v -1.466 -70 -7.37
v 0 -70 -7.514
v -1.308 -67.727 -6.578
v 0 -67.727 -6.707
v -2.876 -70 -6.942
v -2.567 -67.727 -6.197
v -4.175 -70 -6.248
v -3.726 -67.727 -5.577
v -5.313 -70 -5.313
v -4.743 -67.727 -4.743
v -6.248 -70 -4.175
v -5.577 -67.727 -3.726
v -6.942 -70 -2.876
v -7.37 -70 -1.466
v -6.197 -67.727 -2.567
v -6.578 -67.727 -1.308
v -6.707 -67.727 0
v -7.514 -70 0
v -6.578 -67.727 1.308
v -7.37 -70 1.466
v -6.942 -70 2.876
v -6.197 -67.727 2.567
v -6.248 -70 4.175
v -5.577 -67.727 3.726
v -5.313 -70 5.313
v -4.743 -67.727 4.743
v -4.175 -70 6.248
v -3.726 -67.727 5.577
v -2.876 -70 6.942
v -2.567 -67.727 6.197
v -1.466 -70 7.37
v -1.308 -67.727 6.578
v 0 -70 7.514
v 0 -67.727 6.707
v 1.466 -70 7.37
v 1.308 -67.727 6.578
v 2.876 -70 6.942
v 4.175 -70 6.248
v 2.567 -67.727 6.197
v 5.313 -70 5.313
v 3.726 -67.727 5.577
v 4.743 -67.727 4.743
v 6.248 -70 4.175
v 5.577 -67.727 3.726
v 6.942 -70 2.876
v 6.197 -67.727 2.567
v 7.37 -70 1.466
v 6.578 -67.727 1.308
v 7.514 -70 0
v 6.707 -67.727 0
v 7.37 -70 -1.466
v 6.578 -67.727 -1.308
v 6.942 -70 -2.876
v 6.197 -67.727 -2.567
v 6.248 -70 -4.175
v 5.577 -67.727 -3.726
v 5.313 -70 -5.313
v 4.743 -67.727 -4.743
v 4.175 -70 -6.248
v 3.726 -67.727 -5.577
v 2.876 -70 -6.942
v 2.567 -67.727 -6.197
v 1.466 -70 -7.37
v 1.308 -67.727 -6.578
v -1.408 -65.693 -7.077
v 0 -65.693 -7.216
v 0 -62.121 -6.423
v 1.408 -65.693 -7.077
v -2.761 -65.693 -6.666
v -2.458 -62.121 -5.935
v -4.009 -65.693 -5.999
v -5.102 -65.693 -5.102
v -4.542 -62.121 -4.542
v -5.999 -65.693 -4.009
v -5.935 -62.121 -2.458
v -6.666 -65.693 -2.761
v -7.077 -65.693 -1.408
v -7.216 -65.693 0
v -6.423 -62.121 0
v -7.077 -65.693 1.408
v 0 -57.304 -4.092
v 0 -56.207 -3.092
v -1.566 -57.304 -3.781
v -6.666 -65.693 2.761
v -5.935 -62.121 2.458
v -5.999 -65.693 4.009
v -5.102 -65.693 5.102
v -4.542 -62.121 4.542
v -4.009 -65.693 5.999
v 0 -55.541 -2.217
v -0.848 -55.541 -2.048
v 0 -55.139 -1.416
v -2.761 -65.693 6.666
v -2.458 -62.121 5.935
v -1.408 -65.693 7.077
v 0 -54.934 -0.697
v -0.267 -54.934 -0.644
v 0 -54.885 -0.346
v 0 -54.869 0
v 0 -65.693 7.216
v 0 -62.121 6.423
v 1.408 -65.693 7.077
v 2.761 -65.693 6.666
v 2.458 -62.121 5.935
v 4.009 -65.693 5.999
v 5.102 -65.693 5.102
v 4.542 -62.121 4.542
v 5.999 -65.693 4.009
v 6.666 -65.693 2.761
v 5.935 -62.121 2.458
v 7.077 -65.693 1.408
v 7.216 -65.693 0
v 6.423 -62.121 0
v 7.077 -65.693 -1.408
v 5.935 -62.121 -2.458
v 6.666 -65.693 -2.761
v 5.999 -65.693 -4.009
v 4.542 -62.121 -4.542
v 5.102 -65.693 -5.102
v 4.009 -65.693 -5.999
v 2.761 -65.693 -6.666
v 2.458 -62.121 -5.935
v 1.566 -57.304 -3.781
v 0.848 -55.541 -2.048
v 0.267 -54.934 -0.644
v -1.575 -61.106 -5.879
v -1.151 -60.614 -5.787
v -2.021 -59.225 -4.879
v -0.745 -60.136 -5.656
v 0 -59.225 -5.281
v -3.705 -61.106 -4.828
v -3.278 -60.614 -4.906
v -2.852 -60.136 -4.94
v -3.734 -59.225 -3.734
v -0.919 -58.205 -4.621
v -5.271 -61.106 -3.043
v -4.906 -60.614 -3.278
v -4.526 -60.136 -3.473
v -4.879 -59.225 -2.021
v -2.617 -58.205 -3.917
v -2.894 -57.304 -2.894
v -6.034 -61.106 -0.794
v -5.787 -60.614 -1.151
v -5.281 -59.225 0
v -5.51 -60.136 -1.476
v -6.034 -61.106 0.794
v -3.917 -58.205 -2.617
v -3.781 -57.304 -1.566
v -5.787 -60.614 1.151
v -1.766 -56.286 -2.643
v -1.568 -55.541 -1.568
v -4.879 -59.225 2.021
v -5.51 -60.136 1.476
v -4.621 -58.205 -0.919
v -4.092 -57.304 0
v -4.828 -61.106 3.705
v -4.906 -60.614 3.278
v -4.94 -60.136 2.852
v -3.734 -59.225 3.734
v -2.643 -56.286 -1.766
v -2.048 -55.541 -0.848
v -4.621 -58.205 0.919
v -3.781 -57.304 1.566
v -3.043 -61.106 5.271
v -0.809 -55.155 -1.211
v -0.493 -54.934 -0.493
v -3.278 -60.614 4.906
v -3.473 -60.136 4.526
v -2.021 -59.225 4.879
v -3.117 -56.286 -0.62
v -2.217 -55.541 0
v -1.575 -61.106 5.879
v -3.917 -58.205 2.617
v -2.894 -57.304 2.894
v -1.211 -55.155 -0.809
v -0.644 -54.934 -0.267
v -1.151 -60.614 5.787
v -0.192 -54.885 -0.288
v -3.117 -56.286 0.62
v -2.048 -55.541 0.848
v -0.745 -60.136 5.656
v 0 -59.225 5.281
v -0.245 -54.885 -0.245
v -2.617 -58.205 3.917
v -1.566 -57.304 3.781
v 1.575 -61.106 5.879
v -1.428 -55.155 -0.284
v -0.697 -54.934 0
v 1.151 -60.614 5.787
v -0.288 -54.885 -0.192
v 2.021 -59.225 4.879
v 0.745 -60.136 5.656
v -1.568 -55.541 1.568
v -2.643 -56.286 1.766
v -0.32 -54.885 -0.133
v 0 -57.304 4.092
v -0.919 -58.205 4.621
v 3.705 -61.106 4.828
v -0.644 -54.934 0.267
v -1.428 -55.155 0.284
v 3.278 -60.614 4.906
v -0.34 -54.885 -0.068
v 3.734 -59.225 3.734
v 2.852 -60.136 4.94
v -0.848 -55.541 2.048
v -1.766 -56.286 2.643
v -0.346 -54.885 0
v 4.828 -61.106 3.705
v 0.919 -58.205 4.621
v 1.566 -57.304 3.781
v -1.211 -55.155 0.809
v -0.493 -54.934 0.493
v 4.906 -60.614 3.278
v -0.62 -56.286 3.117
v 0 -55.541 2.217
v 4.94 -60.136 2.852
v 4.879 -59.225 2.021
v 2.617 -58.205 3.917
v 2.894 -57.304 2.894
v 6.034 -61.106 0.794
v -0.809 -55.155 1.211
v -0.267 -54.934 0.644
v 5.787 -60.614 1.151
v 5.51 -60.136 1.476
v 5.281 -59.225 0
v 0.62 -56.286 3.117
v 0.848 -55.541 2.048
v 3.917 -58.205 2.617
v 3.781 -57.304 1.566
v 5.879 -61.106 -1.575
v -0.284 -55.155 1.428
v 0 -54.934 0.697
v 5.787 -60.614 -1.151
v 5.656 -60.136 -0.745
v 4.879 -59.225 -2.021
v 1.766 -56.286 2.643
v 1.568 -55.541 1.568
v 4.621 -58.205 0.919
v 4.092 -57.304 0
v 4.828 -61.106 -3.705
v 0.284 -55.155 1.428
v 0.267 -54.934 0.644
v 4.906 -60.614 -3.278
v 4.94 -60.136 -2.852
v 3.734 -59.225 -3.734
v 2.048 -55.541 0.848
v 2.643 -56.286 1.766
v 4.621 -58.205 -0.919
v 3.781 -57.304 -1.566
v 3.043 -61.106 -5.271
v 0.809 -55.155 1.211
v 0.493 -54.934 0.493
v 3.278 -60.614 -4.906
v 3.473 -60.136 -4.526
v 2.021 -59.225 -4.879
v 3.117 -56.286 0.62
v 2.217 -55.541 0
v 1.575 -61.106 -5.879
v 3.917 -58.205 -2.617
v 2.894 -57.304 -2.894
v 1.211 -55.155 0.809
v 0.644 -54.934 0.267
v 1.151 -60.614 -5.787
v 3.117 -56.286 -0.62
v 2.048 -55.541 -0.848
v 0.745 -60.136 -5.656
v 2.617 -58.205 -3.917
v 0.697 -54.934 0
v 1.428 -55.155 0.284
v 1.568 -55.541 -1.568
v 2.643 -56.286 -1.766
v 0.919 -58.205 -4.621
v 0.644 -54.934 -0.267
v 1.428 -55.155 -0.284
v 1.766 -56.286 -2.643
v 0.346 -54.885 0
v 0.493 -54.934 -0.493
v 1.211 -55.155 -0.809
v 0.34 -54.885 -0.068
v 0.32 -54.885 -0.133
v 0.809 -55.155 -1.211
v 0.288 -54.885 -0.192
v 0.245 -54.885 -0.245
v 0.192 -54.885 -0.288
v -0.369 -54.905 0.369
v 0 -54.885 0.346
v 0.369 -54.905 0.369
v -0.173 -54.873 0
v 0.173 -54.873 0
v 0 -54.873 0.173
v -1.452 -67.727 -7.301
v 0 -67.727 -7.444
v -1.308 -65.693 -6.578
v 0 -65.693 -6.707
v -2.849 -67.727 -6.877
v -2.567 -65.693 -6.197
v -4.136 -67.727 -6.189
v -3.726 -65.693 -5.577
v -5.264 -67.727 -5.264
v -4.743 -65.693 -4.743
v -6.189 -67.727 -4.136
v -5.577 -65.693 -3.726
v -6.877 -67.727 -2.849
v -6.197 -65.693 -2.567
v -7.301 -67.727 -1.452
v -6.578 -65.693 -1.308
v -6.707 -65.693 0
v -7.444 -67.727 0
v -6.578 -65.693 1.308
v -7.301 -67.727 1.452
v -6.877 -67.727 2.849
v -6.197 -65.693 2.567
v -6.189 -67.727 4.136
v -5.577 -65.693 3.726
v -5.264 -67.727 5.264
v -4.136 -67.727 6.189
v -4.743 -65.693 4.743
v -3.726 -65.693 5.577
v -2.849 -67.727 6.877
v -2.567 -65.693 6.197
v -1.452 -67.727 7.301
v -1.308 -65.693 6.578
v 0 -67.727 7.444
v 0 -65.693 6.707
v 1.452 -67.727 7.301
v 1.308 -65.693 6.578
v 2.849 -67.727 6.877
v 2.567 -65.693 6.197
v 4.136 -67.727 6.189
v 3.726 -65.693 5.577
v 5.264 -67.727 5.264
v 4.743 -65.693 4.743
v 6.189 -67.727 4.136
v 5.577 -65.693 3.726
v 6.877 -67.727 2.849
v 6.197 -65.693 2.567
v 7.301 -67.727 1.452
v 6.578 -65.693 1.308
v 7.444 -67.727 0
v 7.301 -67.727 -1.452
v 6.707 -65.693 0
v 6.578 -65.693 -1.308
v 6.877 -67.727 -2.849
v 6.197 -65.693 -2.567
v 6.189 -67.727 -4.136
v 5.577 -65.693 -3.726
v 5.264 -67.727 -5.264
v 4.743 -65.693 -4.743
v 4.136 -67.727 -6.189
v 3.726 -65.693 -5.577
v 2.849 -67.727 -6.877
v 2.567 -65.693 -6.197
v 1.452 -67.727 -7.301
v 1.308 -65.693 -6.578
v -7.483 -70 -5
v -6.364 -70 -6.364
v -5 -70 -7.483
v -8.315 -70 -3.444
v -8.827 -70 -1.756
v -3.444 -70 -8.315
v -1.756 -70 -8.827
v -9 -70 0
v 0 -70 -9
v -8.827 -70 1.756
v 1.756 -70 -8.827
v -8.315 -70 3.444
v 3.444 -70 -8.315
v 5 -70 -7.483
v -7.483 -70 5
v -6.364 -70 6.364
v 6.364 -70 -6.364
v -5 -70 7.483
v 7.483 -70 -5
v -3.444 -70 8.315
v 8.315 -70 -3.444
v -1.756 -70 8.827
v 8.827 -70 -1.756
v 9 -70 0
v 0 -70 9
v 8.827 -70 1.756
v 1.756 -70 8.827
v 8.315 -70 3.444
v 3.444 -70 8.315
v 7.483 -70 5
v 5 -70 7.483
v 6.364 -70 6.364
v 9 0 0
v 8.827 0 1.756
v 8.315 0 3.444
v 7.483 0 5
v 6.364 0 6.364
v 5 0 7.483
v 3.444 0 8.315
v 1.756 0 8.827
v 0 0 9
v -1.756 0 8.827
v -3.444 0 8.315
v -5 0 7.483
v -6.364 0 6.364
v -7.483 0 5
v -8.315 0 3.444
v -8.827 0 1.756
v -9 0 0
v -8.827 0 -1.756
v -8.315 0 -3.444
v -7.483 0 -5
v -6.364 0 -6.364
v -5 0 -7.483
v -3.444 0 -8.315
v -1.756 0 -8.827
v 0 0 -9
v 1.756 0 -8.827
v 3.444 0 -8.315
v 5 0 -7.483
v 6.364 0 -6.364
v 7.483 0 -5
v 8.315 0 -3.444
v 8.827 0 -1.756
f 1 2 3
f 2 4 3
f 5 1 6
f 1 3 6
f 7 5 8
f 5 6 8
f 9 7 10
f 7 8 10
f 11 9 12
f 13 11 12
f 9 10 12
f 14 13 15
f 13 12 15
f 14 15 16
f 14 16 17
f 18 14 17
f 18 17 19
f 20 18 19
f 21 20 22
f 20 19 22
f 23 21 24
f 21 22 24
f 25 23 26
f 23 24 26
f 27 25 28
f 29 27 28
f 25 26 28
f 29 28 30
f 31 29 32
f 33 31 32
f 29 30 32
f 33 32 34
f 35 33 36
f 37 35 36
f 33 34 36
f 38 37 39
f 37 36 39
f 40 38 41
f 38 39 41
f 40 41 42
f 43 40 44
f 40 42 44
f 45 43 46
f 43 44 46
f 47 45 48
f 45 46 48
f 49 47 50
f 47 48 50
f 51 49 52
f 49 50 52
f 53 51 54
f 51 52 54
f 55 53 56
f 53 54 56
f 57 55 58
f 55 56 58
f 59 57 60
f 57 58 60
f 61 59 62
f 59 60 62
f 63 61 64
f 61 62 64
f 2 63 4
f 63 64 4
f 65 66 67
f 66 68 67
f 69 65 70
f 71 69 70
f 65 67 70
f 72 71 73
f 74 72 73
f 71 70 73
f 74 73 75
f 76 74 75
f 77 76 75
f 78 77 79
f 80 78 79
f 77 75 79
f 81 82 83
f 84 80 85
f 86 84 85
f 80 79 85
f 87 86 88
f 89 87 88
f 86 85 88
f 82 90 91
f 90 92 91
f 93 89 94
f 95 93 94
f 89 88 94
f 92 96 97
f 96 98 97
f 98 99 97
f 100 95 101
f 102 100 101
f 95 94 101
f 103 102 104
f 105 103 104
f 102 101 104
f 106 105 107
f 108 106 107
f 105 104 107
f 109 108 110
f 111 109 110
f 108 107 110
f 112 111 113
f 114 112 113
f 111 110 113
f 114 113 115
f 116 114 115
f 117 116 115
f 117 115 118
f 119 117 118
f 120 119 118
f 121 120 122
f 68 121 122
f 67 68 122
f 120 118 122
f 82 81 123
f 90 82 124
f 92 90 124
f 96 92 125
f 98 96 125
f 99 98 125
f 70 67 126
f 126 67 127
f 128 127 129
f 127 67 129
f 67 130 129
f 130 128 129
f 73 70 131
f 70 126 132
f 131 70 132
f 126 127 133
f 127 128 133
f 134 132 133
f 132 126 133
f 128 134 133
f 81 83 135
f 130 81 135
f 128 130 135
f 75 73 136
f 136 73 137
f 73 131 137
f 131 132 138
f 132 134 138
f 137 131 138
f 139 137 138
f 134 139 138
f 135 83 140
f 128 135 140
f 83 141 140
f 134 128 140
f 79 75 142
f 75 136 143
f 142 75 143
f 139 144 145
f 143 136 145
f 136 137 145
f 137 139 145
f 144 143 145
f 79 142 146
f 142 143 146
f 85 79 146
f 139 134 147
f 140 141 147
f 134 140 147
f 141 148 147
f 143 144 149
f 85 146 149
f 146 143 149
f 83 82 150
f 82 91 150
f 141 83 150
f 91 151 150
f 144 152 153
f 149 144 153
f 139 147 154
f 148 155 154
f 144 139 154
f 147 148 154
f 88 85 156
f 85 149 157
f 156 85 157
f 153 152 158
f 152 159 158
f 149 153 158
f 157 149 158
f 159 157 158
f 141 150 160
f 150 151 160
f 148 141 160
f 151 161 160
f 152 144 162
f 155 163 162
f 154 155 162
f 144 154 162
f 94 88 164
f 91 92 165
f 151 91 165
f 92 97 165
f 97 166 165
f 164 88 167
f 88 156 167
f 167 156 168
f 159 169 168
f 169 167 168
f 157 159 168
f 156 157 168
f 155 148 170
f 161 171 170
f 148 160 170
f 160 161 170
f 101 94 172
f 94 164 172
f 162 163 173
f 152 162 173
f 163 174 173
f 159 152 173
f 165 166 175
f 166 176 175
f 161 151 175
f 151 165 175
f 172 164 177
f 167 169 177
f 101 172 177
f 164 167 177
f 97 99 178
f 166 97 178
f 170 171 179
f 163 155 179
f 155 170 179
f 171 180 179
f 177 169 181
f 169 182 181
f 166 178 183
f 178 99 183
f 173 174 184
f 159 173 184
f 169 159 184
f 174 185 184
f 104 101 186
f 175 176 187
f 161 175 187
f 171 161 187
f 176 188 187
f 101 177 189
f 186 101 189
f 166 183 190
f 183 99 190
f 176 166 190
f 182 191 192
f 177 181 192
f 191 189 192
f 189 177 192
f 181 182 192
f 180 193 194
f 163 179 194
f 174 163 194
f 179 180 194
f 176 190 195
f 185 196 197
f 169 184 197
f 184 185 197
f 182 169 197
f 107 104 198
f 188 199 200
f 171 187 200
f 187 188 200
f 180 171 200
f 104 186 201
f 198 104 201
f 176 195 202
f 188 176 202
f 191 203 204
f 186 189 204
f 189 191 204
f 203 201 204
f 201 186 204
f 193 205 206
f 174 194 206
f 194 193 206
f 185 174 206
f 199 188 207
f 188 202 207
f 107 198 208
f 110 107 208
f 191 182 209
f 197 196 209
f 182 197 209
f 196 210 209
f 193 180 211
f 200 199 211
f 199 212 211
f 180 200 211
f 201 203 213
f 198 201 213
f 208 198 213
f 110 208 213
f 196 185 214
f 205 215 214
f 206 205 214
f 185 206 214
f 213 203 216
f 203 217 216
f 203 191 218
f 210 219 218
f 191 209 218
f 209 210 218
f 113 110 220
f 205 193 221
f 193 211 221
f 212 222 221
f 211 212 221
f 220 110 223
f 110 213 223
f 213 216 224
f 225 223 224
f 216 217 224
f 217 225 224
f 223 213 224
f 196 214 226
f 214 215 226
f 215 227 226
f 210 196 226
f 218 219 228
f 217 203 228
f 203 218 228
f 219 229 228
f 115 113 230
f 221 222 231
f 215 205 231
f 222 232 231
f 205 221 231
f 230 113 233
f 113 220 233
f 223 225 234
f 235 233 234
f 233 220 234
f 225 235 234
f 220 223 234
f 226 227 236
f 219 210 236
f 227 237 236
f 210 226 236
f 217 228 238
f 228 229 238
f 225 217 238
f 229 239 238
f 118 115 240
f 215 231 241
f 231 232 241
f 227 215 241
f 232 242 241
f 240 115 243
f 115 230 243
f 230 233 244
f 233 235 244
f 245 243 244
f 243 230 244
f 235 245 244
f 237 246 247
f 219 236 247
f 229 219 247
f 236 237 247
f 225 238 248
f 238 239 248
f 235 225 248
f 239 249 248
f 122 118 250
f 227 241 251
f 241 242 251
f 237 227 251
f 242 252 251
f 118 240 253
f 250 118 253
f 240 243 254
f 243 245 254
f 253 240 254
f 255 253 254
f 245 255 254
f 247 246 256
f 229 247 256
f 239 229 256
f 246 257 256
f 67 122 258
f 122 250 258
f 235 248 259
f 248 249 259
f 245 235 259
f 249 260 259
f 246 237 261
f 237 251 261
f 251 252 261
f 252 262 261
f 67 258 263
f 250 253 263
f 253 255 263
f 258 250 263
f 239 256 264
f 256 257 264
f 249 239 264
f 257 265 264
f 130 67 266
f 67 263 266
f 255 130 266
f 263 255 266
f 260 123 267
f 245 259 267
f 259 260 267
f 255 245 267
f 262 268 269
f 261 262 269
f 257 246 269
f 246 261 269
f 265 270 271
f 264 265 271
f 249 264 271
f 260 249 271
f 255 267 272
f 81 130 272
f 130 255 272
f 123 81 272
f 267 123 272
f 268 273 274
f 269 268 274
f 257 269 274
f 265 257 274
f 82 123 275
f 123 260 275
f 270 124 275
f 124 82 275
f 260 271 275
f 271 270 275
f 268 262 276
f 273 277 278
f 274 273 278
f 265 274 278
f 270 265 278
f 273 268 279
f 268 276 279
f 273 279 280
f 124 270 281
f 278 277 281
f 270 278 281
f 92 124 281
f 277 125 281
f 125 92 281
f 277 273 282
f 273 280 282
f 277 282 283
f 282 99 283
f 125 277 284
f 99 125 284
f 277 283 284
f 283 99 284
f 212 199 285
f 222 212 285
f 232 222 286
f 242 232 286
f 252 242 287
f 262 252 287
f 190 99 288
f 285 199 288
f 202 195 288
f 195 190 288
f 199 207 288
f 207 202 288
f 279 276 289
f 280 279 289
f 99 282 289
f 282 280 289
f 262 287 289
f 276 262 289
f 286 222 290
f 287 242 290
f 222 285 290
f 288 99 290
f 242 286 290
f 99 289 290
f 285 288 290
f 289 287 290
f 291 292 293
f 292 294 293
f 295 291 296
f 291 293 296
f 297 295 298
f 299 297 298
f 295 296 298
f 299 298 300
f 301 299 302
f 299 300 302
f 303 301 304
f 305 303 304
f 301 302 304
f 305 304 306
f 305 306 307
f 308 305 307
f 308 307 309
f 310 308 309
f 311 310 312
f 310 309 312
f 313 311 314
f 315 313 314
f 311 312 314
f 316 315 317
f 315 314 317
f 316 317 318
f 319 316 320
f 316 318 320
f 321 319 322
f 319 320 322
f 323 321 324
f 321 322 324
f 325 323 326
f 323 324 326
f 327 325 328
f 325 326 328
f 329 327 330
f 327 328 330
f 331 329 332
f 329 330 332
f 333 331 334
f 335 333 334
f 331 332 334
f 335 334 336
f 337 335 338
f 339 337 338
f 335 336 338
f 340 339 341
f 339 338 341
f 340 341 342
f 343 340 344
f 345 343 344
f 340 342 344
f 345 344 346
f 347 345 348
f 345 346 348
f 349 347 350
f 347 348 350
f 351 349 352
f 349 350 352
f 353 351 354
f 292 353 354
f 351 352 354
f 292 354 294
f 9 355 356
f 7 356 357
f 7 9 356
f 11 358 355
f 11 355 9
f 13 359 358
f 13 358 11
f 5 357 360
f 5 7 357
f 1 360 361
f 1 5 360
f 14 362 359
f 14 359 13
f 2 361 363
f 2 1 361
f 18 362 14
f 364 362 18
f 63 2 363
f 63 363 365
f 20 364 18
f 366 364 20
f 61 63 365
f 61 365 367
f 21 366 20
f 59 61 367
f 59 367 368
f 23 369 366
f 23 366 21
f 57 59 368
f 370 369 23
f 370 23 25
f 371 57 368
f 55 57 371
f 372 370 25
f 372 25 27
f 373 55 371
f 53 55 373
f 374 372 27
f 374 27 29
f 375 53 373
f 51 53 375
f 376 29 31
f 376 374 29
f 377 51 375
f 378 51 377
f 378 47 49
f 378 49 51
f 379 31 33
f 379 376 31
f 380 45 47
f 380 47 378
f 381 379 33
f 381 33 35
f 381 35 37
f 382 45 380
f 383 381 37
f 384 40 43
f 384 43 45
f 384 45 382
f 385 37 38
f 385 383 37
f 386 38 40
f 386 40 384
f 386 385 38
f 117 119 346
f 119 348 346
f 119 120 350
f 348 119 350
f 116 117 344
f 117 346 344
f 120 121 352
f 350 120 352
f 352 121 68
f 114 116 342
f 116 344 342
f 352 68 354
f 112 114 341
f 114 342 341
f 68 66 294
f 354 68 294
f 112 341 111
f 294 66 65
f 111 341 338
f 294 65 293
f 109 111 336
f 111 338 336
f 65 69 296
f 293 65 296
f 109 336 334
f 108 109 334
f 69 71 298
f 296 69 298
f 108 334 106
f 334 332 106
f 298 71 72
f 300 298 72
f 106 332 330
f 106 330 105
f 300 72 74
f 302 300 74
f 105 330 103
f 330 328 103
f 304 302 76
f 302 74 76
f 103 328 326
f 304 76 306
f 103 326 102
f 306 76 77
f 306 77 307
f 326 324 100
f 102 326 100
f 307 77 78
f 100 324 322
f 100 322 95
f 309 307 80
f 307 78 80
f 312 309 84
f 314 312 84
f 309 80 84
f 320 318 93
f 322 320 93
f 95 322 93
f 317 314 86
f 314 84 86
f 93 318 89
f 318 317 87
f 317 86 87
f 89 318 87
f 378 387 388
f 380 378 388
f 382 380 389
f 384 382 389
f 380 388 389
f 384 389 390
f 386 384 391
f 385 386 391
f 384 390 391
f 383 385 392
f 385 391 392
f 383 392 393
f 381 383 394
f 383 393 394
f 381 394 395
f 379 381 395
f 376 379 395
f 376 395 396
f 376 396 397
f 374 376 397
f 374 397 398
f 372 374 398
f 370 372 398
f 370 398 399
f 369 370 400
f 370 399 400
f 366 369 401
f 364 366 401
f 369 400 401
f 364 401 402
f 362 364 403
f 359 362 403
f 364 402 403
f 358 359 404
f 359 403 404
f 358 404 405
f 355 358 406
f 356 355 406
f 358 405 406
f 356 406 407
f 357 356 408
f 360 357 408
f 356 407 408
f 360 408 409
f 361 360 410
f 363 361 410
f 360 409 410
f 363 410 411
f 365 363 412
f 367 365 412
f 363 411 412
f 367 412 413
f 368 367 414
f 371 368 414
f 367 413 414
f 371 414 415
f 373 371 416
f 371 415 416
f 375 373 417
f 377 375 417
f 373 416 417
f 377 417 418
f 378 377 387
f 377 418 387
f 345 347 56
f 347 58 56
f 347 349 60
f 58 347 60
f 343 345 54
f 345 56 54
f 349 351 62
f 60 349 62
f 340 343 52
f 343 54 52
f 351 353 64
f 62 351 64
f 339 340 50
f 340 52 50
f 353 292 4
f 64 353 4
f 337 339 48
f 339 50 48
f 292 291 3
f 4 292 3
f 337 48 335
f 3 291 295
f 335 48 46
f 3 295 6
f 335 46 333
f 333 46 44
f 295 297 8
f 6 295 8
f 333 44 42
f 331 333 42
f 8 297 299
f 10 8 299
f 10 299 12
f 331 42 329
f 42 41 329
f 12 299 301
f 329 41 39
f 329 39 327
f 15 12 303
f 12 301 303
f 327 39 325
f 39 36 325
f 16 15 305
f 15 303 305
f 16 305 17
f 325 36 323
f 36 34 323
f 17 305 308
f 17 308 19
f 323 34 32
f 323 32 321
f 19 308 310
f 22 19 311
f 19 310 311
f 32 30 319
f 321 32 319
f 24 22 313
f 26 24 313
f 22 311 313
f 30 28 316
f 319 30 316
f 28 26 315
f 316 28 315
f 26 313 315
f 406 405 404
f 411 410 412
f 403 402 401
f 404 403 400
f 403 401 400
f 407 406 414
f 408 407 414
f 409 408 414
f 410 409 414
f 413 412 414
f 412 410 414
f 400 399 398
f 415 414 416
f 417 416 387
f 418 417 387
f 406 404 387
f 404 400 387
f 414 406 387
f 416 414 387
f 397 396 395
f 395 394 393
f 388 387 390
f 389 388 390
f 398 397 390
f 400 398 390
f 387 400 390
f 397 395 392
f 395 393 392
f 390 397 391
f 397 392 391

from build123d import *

# Parameters (mm, degrees)
F0_R     = 9
F1_DEPTH = 70


with BuildPart() as f1:
    # F0 (on Front) → F1 (new body)
    with BuildSketch(Plane.XZ):
        Circle(F0_R)
    extrude(amount=F1_DEPTH)

    # F2 (on Right) → F3 (revolve, cut)
    with BuildSketch(Plane.YZ):
        with BuildLine():
            Line((-65.6930357218, -6.7071020603), (-65.6930357218, -7.2155290418))
            add(Edge.make_bspline(
                [(-65.6930357218, -7.2155290418), (-54.8685416579, -5.6061186379), (-54.8685416579, 0)],
                knots=[5.0035671981, 5.0035671981, 5.0035671981, 6.2831853072, 6.2831853072, 6.2831853072], degree=2, weights=[1, 0.802209775, 1]))
            Line((-54.8685416579, 0), (-65.6930357218, 0))
            Line((-65.6930357218, 0), (-67.727163434, 0))
            Line((-67.727163434, 0), (-70.0518861413, 0))
            Line((-70.0518861413, 0), (-70.0518861413, -7.5326042516))
            Line((-70.0518861413, -7.5326042516), (-67.727163434, -6.7071020603))
            Line((-67.727163434, -6.7071020603), (-67.727163434, -7.443788395))
            Line((-67.727163434, -7.443788395), (-65.6930357218, -6.7071020603))
        make_face()
    revolve(axis=Axis((0, -60.2807886899, 0), (0, 1, 0)), mode=Mode.SUBTRACT)


solid = f1.part
